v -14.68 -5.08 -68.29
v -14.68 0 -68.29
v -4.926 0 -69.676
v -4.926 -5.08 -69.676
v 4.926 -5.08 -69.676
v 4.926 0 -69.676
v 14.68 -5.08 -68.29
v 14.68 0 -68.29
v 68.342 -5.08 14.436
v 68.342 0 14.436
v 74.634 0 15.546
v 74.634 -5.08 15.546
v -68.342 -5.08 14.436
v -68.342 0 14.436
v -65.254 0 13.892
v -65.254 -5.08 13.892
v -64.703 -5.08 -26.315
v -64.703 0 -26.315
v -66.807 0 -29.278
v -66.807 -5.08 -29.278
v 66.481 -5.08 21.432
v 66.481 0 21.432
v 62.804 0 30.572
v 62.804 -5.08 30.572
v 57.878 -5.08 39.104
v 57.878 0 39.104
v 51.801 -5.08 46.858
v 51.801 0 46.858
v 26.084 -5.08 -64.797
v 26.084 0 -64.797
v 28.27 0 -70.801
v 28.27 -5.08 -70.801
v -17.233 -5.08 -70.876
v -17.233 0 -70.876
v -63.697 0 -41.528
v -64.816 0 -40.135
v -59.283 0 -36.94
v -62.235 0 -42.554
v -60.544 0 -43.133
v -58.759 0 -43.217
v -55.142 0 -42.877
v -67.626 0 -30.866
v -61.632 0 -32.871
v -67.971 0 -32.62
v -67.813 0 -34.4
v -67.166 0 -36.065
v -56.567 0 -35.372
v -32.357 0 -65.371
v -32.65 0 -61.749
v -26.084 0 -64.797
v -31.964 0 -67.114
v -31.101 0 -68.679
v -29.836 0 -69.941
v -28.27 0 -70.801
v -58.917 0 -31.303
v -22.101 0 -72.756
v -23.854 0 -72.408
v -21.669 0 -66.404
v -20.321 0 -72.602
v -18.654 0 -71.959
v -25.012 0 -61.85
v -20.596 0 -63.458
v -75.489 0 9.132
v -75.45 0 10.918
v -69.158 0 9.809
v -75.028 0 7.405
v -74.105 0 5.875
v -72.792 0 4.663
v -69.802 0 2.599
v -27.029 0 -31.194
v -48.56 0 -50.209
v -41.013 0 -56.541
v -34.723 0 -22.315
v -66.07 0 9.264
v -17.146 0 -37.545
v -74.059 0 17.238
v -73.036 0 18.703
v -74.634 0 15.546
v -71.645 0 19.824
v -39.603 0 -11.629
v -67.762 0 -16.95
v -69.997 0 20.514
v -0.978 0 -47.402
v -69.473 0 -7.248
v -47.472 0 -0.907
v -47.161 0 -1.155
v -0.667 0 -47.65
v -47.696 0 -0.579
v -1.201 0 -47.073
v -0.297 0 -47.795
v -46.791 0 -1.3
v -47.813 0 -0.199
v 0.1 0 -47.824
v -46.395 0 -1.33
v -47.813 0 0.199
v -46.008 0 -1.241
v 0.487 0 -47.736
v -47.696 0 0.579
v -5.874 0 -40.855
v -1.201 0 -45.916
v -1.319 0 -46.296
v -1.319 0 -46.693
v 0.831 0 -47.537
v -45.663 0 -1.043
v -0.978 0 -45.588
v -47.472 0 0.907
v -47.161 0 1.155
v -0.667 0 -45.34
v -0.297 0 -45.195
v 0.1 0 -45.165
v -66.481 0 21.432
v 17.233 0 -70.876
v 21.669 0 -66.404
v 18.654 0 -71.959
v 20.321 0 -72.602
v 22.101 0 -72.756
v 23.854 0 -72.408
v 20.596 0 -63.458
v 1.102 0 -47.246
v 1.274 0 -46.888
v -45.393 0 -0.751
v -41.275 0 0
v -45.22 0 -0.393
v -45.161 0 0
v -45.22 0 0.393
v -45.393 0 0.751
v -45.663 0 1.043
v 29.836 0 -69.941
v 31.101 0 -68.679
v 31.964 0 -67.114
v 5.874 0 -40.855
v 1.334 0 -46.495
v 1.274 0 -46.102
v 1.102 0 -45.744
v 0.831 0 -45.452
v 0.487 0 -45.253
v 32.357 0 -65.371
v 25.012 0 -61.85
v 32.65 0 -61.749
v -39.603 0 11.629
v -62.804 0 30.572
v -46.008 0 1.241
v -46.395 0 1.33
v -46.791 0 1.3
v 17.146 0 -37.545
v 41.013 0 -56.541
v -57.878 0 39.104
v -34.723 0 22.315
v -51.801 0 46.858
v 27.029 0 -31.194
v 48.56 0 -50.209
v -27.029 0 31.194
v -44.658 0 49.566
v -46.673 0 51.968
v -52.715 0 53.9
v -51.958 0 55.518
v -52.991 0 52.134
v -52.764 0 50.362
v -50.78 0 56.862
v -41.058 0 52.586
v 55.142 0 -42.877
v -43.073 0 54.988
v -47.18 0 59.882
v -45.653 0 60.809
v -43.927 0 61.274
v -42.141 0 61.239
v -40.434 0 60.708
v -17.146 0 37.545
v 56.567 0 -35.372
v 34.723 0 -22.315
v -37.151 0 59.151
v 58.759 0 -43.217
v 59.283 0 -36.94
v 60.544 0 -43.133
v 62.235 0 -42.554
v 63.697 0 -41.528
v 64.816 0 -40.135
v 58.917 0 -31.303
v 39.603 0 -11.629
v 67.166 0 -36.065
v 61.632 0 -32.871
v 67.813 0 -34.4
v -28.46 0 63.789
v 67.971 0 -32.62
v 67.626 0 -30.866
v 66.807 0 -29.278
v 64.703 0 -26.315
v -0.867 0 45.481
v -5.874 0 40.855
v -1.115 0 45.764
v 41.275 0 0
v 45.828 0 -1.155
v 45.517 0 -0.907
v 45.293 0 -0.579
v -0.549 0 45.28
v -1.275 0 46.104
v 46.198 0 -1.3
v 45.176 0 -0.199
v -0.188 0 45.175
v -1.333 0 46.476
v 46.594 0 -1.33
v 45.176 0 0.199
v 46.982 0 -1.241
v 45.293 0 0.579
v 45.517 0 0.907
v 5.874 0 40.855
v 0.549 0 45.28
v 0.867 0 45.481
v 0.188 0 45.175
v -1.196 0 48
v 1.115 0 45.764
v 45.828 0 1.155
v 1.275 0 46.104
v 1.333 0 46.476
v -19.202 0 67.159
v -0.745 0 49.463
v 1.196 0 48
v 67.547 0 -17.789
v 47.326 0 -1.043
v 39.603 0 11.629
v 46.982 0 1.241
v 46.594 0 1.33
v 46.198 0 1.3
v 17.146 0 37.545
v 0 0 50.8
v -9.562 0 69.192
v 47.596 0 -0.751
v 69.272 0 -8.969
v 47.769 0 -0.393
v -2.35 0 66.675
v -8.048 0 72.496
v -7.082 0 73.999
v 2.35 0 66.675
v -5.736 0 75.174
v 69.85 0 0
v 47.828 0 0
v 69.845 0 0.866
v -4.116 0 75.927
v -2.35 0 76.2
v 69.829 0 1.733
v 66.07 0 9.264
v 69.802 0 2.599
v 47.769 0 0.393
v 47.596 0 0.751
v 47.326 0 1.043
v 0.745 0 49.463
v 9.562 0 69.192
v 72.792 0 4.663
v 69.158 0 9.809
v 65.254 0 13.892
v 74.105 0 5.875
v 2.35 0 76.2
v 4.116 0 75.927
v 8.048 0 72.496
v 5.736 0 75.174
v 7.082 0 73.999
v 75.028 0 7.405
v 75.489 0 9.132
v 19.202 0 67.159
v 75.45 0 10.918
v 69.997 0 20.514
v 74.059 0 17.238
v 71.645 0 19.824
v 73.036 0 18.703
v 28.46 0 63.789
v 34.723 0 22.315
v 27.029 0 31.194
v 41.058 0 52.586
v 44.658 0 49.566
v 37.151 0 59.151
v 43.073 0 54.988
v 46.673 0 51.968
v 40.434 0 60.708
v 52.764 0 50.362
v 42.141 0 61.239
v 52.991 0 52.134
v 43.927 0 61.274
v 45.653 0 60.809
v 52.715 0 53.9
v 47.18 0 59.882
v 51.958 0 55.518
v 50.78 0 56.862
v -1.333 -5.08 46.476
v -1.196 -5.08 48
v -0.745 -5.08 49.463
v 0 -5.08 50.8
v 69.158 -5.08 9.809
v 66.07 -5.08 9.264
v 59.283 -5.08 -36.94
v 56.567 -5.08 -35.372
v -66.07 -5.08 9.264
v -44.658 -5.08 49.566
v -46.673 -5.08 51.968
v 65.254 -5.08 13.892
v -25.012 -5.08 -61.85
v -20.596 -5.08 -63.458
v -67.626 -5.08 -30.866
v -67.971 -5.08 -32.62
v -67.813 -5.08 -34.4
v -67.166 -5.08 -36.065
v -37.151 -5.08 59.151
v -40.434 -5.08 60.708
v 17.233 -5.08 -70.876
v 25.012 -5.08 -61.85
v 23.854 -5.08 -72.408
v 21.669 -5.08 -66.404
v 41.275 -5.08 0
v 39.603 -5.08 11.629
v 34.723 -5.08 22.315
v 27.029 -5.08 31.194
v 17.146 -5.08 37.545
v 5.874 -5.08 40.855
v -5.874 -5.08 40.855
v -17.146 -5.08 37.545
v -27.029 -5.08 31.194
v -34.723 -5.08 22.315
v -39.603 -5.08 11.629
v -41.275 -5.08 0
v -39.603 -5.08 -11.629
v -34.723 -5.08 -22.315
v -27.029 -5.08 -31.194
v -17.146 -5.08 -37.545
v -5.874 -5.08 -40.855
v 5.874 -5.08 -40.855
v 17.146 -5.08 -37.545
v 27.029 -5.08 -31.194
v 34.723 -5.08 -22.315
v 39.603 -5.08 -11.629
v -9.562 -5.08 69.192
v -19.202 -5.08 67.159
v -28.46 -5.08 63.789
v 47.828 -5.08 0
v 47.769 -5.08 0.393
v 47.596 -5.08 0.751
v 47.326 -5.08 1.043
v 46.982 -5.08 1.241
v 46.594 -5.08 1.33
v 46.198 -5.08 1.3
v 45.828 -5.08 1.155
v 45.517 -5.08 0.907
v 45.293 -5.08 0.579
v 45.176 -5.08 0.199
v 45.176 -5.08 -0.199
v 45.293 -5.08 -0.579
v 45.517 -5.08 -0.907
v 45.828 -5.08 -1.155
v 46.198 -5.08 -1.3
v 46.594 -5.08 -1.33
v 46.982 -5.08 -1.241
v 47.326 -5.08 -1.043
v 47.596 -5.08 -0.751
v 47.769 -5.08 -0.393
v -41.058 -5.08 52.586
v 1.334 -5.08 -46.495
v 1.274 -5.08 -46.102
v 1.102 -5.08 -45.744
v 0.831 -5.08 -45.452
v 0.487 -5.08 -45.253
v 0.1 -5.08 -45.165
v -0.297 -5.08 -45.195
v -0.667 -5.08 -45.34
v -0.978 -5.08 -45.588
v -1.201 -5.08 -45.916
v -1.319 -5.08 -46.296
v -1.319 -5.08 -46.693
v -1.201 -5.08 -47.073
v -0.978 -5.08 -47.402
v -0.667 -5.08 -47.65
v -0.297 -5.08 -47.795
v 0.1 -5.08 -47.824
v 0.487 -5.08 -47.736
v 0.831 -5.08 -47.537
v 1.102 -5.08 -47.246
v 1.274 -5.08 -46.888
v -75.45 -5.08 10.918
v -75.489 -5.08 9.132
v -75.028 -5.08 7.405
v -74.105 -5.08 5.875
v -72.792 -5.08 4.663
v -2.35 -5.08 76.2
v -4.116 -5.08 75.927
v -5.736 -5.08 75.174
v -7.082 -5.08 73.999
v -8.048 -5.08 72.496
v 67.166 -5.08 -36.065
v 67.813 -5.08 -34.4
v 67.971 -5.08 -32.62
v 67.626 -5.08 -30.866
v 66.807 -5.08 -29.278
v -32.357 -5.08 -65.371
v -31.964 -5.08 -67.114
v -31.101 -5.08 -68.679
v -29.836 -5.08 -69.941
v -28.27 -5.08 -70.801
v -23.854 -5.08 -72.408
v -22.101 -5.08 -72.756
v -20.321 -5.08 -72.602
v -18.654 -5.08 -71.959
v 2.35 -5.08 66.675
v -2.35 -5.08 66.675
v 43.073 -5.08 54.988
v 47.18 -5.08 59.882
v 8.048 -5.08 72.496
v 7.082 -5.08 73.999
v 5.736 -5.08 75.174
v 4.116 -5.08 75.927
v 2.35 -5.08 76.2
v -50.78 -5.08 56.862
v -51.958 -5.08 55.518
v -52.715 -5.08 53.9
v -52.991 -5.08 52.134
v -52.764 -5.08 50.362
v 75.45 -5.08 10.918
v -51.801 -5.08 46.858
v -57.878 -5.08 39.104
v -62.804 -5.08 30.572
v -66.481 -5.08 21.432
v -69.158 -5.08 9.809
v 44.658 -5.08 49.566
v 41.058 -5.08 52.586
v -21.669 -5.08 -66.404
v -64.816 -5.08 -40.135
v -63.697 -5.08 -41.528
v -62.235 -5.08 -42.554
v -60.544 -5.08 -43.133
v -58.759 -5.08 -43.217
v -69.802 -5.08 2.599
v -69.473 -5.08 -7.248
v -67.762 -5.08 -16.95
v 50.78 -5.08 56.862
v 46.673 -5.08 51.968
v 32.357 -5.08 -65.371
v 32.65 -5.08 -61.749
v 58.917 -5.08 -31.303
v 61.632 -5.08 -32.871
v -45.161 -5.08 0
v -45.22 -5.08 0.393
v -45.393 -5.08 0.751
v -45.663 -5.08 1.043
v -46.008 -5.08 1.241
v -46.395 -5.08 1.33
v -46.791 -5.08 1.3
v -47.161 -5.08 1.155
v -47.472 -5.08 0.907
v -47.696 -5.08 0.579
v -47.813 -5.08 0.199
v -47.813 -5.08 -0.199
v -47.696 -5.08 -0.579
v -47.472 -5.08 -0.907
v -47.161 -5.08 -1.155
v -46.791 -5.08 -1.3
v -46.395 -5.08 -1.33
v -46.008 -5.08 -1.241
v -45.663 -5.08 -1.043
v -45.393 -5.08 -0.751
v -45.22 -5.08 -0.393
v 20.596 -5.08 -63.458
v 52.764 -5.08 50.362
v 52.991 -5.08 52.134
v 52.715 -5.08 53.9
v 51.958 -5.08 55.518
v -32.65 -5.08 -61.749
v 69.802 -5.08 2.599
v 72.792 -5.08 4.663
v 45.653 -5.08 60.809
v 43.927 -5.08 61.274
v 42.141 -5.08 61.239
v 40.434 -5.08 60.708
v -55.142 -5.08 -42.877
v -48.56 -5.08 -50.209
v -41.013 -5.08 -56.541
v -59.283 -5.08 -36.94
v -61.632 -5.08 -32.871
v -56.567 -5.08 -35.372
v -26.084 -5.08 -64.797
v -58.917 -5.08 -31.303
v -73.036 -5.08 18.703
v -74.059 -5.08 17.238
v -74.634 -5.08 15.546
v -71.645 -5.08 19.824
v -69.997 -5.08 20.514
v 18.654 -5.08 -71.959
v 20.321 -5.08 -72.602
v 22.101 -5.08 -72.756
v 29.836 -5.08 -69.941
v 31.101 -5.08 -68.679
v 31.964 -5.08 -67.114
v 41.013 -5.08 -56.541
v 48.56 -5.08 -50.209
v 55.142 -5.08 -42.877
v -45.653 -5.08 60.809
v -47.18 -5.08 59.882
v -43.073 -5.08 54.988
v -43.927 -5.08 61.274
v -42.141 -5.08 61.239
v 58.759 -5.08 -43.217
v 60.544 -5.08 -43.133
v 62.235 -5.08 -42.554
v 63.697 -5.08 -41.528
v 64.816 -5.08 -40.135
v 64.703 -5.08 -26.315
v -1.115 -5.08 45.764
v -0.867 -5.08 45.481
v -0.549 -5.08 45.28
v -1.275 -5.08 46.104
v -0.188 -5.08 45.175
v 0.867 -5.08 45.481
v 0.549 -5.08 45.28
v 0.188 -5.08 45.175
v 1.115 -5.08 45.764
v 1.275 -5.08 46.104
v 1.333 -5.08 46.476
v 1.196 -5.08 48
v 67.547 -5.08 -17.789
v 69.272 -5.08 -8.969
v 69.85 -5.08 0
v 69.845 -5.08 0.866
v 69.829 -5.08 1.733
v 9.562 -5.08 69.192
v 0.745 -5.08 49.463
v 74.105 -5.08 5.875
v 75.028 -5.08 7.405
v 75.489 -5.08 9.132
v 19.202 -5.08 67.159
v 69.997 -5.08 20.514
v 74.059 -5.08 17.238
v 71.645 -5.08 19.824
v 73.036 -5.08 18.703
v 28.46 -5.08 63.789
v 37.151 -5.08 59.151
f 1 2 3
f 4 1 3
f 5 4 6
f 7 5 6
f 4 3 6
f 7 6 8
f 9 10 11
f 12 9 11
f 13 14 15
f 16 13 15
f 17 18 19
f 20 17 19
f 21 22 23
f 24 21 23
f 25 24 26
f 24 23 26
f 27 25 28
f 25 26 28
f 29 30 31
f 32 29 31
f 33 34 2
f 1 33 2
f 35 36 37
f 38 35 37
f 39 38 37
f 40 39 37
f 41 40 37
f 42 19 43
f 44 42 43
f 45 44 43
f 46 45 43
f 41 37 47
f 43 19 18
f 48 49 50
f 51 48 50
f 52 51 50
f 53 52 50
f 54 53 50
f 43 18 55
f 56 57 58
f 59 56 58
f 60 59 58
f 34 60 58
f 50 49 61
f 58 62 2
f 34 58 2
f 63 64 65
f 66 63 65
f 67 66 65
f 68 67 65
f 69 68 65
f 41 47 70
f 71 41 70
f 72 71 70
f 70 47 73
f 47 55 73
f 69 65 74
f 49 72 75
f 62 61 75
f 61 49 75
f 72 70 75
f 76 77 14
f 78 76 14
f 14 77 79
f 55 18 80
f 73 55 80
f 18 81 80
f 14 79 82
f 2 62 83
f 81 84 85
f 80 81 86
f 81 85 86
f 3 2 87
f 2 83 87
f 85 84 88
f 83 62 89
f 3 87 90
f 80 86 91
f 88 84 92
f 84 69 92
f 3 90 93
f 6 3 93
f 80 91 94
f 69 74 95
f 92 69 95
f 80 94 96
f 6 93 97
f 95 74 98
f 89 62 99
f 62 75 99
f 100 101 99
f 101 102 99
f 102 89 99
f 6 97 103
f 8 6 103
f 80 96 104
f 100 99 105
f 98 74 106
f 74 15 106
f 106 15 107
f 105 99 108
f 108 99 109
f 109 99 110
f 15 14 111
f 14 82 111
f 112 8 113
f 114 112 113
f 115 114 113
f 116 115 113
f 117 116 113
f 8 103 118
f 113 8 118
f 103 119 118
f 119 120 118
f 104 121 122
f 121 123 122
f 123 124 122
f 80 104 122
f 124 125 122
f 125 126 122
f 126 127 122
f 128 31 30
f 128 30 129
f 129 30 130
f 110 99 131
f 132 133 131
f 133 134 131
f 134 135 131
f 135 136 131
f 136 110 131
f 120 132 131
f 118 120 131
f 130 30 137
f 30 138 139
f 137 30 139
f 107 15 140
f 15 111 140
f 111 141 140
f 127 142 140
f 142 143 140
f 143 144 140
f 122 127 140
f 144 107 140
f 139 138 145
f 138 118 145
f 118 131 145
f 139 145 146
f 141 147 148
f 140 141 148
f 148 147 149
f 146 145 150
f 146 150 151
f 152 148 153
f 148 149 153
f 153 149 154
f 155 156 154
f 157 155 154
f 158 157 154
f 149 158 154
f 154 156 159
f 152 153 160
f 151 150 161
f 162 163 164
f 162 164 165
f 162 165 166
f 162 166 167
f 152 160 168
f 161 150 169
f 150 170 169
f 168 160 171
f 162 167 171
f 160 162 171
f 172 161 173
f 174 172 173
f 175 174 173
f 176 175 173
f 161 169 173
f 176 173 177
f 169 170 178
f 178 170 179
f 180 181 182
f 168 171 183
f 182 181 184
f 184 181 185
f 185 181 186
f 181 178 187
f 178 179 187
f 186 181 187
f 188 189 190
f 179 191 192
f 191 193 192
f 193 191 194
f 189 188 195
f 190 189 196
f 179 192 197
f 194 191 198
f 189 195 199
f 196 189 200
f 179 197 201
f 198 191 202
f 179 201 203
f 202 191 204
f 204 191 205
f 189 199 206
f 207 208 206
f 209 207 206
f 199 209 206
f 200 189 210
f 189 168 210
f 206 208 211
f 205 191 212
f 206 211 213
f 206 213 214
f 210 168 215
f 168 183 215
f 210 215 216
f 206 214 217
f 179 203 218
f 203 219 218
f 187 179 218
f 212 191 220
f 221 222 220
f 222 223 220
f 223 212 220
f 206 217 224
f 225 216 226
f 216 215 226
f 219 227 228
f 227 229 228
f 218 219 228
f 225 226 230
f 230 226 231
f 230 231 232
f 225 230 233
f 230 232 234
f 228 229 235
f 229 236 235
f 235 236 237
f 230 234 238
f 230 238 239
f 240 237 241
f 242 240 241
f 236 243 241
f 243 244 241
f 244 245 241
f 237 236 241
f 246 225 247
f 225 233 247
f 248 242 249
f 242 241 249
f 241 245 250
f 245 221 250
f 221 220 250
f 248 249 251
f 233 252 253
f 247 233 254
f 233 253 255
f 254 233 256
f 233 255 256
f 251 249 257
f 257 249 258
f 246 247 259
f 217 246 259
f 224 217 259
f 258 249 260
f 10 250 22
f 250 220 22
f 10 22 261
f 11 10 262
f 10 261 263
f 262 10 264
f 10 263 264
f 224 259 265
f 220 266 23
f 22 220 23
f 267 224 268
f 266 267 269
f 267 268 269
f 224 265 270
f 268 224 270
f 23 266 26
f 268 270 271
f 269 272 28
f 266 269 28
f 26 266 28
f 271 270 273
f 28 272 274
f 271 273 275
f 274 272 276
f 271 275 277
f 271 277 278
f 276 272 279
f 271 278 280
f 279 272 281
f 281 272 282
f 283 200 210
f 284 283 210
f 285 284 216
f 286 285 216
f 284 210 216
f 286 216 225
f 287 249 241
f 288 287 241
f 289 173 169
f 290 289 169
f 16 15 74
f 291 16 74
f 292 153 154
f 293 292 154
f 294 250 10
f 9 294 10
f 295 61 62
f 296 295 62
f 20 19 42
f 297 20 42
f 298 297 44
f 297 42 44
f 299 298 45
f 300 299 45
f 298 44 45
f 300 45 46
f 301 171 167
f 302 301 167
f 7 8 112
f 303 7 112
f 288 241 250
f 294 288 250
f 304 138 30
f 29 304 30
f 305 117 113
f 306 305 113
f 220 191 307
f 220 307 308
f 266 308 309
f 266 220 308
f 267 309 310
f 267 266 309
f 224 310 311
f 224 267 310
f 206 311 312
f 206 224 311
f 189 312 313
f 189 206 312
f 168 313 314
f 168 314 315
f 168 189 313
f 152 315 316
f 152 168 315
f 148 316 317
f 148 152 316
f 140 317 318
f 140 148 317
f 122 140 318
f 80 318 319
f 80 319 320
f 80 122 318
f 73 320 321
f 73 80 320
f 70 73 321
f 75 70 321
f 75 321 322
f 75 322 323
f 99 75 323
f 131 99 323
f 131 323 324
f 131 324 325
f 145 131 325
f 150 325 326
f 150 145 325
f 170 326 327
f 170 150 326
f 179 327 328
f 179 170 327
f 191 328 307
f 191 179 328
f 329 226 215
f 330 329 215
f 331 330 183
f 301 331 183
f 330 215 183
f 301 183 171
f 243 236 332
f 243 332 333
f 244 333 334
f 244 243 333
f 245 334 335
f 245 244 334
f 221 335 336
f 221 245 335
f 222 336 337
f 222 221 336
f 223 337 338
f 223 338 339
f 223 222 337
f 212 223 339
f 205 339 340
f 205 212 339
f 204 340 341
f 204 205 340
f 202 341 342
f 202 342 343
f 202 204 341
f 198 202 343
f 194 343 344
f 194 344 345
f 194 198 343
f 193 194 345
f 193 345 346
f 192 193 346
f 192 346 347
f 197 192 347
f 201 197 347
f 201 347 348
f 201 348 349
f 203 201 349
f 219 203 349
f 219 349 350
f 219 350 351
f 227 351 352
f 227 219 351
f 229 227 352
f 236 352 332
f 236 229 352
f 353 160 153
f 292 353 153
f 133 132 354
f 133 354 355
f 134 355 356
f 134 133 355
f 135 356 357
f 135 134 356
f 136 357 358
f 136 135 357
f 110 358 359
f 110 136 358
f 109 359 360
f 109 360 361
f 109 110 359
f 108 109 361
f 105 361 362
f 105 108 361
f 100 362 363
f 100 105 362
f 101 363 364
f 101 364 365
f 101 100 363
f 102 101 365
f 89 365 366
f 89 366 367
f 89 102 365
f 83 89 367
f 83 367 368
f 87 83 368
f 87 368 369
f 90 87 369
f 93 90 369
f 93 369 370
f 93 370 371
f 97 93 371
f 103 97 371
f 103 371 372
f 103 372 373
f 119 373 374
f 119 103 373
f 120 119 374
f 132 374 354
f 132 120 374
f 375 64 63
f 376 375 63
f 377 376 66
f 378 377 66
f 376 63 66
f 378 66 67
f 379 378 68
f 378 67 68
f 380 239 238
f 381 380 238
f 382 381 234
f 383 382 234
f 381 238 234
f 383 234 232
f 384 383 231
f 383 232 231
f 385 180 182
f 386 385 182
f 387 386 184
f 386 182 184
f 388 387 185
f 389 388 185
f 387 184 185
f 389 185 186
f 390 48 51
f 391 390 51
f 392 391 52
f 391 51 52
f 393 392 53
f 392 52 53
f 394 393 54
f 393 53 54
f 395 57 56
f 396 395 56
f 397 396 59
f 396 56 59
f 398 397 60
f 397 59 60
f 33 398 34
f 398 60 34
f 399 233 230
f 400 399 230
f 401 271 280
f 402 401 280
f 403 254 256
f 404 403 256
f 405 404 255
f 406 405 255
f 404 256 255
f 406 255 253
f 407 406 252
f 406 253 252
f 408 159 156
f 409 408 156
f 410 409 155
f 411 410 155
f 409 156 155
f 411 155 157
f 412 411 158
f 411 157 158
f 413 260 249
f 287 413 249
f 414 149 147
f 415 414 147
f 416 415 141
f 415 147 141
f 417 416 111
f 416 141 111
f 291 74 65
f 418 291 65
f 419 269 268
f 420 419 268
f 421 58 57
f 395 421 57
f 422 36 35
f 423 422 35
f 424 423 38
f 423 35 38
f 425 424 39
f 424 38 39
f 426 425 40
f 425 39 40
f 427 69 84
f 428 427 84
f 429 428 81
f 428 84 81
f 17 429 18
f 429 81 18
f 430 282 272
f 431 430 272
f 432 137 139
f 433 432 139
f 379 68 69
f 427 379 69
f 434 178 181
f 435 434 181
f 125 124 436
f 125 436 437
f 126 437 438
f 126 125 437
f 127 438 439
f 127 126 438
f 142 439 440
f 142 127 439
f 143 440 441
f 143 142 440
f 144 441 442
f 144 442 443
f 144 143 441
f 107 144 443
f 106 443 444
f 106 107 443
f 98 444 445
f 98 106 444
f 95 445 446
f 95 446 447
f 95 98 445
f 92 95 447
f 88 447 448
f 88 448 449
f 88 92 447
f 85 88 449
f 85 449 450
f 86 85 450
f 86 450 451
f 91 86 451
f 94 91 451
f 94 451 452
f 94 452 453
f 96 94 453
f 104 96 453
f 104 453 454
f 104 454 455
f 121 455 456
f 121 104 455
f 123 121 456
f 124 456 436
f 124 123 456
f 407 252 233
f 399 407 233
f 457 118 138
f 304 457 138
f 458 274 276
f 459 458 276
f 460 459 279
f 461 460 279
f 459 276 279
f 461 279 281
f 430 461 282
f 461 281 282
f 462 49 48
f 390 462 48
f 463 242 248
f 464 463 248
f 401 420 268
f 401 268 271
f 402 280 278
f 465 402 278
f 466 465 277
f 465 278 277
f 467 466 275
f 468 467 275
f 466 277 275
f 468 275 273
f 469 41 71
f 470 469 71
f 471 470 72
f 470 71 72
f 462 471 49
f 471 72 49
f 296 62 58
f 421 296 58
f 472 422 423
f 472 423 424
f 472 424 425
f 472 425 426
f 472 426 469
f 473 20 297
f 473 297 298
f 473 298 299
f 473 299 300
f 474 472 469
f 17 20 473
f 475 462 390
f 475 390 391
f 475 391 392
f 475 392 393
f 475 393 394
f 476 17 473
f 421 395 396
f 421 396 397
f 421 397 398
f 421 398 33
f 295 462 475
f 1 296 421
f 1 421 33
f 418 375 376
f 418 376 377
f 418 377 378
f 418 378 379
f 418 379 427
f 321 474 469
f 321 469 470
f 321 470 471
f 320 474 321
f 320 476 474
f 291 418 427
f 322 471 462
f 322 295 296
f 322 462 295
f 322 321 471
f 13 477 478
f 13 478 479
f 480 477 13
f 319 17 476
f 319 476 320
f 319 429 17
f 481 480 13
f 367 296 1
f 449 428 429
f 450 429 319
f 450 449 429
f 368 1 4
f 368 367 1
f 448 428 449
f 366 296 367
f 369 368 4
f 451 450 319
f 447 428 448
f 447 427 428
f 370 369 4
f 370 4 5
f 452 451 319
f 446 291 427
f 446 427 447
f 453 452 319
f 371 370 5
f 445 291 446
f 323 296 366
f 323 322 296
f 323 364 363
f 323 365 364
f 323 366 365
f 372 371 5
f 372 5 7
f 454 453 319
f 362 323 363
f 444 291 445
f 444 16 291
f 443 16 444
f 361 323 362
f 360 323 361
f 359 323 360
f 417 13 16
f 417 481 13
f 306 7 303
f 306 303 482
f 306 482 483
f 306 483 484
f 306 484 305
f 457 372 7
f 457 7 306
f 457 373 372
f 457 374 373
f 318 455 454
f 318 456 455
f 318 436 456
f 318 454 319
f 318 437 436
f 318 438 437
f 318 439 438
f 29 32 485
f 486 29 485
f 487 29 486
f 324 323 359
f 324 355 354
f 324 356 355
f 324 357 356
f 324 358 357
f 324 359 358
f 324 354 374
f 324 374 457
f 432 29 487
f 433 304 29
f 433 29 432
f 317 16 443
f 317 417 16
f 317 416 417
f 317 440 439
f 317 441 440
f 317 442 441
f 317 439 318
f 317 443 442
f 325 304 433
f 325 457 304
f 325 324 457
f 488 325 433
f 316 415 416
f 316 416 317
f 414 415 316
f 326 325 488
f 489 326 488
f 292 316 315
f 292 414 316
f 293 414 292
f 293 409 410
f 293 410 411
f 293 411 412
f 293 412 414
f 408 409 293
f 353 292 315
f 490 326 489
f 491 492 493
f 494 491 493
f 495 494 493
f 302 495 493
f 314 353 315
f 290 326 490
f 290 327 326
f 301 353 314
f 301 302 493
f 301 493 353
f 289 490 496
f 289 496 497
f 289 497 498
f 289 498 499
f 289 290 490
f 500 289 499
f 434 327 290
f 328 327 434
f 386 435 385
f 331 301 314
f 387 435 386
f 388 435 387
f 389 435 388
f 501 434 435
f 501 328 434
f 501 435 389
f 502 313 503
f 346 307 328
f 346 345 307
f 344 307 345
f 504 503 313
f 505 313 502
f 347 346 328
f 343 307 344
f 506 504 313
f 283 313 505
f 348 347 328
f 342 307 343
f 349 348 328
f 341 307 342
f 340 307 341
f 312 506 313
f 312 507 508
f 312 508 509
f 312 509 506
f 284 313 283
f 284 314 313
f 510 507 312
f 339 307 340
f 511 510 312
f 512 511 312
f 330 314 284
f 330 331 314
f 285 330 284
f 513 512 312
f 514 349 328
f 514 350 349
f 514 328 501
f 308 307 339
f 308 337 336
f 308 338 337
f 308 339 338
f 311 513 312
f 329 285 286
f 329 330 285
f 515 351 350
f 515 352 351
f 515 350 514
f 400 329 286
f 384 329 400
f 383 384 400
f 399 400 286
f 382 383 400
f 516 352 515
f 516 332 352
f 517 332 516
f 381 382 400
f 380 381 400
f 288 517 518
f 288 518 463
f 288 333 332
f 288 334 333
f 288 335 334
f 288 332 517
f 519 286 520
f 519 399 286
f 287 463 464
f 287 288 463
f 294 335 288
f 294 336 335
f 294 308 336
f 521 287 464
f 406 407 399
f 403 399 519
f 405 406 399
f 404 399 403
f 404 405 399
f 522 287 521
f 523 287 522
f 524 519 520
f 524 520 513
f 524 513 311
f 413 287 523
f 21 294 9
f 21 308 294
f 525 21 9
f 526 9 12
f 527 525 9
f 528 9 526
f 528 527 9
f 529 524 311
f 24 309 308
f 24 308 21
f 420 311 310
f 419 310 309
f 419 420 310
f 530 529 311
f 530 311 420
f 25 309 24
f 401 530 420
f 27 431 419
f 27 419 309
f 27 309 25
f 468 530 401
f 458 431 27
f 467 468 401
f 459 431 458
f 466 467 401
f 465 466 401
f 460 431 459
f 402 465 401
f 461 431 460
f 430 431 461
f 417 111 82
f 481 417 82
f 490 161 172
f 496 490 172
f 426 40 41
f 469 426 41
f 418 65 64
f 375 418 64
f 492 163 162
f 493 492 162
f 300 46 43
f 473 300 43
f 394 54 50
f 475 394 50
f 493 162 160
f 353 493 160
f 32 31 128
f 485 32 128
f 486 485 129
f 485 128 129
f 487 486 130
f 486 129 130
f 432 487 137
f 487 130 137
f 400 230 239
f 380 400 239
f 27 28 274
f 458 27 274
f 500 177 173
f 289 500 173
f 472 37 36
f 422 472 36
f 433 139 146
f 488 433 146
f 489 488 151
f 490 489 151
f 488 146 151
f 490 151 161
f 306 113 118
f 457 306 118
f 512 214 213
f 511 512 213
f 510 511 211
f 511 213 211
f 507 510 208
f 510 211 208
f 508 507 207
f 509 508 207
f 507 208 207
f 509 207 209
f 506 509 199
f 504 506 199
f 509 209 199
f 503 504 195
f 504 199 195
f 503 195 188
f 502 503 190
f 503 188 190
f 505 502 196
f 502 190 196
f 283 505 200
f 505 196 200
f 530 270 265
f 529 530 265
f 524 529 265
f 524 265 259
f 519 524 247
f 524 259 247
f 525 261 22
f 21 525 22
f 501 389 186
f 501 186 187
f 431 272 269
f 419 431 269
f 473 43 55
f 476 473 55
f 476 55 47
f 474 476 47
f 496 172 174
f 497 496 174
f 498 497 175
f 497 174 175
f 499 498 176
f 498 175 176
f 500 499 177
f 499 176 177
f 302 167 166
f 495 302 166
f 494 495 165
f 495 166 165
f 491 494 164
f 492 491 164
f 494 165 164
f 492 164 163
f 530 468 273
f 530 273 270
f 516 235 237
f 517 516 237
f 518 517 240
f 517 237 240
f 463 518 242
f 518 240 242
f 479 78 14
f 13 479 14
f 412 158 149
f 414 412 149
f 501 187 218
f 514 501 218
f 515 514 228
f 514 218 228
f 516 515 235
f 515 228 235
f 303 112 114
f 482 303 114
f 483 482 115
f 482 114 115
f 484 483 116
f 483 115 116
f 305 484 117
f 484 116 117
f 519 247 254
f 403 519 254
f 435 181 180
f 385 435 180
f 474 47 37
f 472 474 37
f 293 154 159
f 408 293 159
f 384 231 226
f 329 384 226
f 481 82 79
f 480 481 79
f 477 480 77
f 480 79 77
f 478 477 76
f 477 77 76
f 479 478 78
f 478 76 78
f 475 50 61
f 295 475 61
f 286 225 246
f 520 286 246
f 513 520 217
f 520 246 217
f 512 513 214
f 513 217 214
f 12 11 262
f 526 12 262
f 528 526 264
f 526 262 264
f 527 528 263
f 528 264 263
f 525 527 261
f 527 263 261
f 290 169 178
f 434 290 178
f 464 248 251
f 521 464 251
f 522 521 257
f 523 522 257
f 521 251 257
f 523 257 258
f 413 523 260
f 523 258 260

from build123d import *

# Parameters (mm, degrees)
F0_R     = 1.3335
F0_R_2   = 41.275
F1_DEPTH = 5.08


with BuildPart() as f1:
    # F0 (on Front) → F1 (new body)
    with BuildSketch(Plane.XZ):
        with BuildLine():
            ThreePointArc((64.703313688, -26.3154649928), (68.5512544054, -13.4070138154), (69.85, 0))
            ThreePointArc((69.85, 0), (69.8379103341, 1.2995307458), (69.8016455216, 2.5986116451))
            ThreePointArc((69.8016455216, 2.5986116451), (69.5732263207, 6.2119786965), (69.1578829213, 9.8086558631))
            Line((69.1578829213, 9.8086558631), (66.0700433255, 9.2641864302))
            Line((66.0700433255, 9.2641864302), (65.2540705387, 13.8917980616))
            Line((65.2540705387, 13.8917980616), (68.3419101345, 14.4362674945))
            ThreePointArc((68.3419101345, 14.4362674945), (67.502069222, 17.9580942962), (66.4808687426, 21.4316726185))
            ThreePointArc((66.4808687426, 21.4316726185), (60.4918744543, 34.925), (51.8008073045, 46.8582848875))
            ThreePointArc((51.8008073045, 46.8582848875), (49.3032004751, 49.4794596061), (46.6731294533, 51.9676965724))
            Line((46.6731294533, 51.9676965724), (44.657685295, 49.565783756))
            Line((44.657685295, 49.565783756), (41.0580424567, 52.5862427339))
            Line((41.0580424567, 52.5862427339), (43.0734866151, 54.9881555503))
            ThreePointArc((43.0734866151, 54.9881555503), (40.1663445193, 57.1461920687), (37.15128646, 59.1506924251))
            ThreePointArc((37.15128646, 59.1506924251), (23.8901070113, 65.6375295619), (9.5617956478, 69.1924458593))
            ThreePointArc((9.5617956478, 69.1924458593), (5.9636591831, 69.5949514631), (2.3495, 69.8104744988))
            Line((2.3495, 69.8104744988), (2.3495, 66.675))
            Line((2.3495, 66.675), (-2.3495, 66.675))
            Line((-2.3495, 66.675), (-2.3495, 69.8104744988))
            ThreePointArc((-2.3495, 69.8104744988), (-5.9636591831, 69.5949514631), (-9.5617956478, 69.1924458593))
            ThreePointArc((-9.5617956478, 69.1924458593), (-23.8901070113, 65.6375295619), (-37.15128646, 59.1506924251))
            ThreePointArc((-37.15128646, 59.1506924251), (-40.1663445193, 57.1461920687), (-43.0734866151, 54.9881555503))
            Line((-43.0734866151, 54.9881555503), (-41.0580424567, 52.5862427339))
            Line((-41.0580424567, 52.5862427339), (-44.657685295, 49.565783756))
            Line((-44.657685295, 49.565783756), (-46.6731294533, 51.9676965724))
            ThreePointArc((-46.6731294533, 51.9676965724), (-49.3032004751, 49.4794596061), (-51.8008073045, 46.8582848875))
            ThreePointArc((-51.8008073045, 46.8582848875), (-60.4918744543, 34.925), (-66.4808687426, 21.4316726185))
            ThreePointArc((-66.4808687426, 21.4316726185), (-67.502069222, 17.9580942962), (-68.3419101345, 14.4362674945))
            Line((-68.3419101345, 14.4362674945), (-65.2540705387, 13.8917980616))
            Line((-65.2540705387, 13.8917980616), (-66.0700433255, 9.2641864302))
            Line((-66.0700433255, 9.2641864302), (-69.1578829213, 9.8086558631))
            ThreePointArc((-69.1578829213, 9.8086558631), (-69.5732263207, 6.2119786965), (-69.8016455216, 2.5986116451))
            ThreePointArc((-69.8016455216, 2.5986116451), (-68.7888215479, -12.12932521), (-64.703313688, -26.3154649928))
            ThreePointArc((-64.703313688, -26.3154649928), (-63.2528255337, -29.6327953794), (-61.6323943662, -32.8705105632))
            Line((-61.6323943662, -32.8705105632), (-58.9169937973, -31.3027733138))
            Line((-58.9169937973, -31.3027733138), (-56.5674937973, -35.3722266862))
            Line((-56.5674937973, -35.3722266862), (-59.2828943662, -36.9399639356))
            ThreePointArc((-59.2828943662, -36.9399639356), (-57.2891663506, -39.9621560836), (-55.1415180402, -42.8769808665))
            ThreePointArc((-55.1415180402, -42.8769808665), (-44.8987145366, -53.5082043519), (-32.6503590616, -61.7493040702))
            ThreePointArc((-32.6503590616, -61.7493040702), (-29.4068818014, -63.3581707653), (-26.0843963063, -64.7968114134))
            Line((-26.0843963063, -64.7968114134), (-25.0120008688, -61.8504291642))
            Line((-25.0120008688, -61.8504291642), (-20.5963852437, -63.4575818176))
            Line((-20.5963852437, -63.4575818176), (-21.6687806812, -66.4039640668))
            ThreePointArc((-21.6687806812, -66.4039640668), (-18.1988687469, -67.4375539024), (-14.6800614381, -68.289957506))
            ThreePointArc((-14.6800614381, -68.289957506), (0, -69.85), (14.6800614381, -68.289957506))
            ThreePointArc((14.6800614381, -68.289957506), (18.1988687469, -67.4375539024), (21.6687806812, -66.4039640668))
            Line((21.6687806812, -66.4039640668), (20.5963852437, -63.4575818176))
            Line((20.5963852437, -63.4575818176), (25.0120008688, -61.8504291642))
            Line((25.0120008688, -61.8504291642), (26.0843963063, -64.7968114134))
            ThreePointArc((26.0843963063, -64.7968114134), (29.4068818014, -63.3581707653), (32.6503590616, -61.7493040702))
            ThreePointArc((32.6503590616, -61.7493040702), (44.8987145366, -53.5082043519), (55.1415180402, -42.8769808665))
            ThreePointArc((55.1415180402, -42.8769808665), (57.2891663506, -39.9621560836), (59.2828943662, -36.9399639356))
            Line((59.2828943662, -36.9399639356), (56.5674937973, -35.3722266862))
            Line((56.5674937973, -35.3722266862), (58.9169937973, -31.3027733138))
            Line((58.9169937973, -31.3027733138), (61.6323943662, -32.8705105632))
            ThreePointArc((61.6323943662, -32.8705105632), (63.2528255337, -29.6327953794), (64.703313688, -26.3154649928))
        make_face()
        with Locations((0, -46.4947)):
            Circle(F0_R, mode=Mode.SUBTRACT)
        with Locations((-46.4947, 0)):
            Circle(F0_R, mode=Mode.SUBTRACT)
        Circle(F0_R_2, mode=Mode.SUBTRACT)
        with Locations((46.4947, 0)):
            Circle(F0_R, mode=Mode.SUBTRACT)
        with BuildLine():
            ThreePointArc((1.3333628788, 46.4755771511), (0, 45.1612), (-1.3333628788, 46.4755771511))
            ThreePointArc((-1.3333628788, 46.4755771511), (-1.0083284803, 48.7431296807), (0, 50.8))
            ThreePointArc((0, 50.8), (1.0083284803, 48.7431296807), (1.3333628788, 46.4755771511))
        make_face(mode=Mode.SUBTRACT)
        with BuildLine():
            ThreePointArc((-43.0734866151, 54.9881555503), (-40.1663445193, 57.1461920687), (-37.15128646, 59.1506924251))
            Line((-37.15128646, 59.1506924251), (-40.4344191153, 60.7079840043))
            ThreePointArc((-40.4344191153, 60.7079840043), (-43.9270989611, 61.2736681367), (-47.1803151418, 59.8824832012))
            Line((-47.1803151418, 59.8824832012), (-43.0734866151, 54.9881555503))
        make_face()
        with BuildLine():
            ThreePointArc((-51.8008073045, 46.8582848875), (-49.3032004751, 49.4794596061), (-46.6731294533, 51.9676965724))
            Line((-46.6731294533, 51.9676965724), (-50.7799579801, 56.8620242233))
            ThreePointArc((-50.7799579801, 56.8620242233), (-52.7149227517, 53.8998084352), (-52.7643301228, 50.3619602255))
            Line((-52.7643301228, 50.3619602255), (-51.8008073045, 46.8582848875))
        make_face()
        with BuildLine():
            ThreePointArc((-9.5617956478, 69.1924458593), (-5.9636591831, 69.5949514631), (-2.3495, 69.8104744988))
            Line((-2.3495, 69.8104744988), (-2.3495, 76.1995654907))
            ThreePointArc((-2.3495, 76.1995654907), (-5.7358446168, 75.1741479273), (-8.047777853, 72.4957574116))
            Line((-8.047777853, 72.4957574116), (-9.5617956478, 69.1924458593))
        make_face()
        with BuildLine():
            ThreePointArc((2.3495, 69.8104744988), (5.9636591831, 69.5949514631), (9.5617956478, 69.1924458593))
            Line((9.5617956478, 69.1924458593), (8.047777853, 72.4957574116))
            ThreePointArc((8.047777853, 72.4957574116), (5.7358446168, 75.1741479273), (2.3495, 76.1995654907))
            Line((2.3495, 76.1995654907), (2.3495, 69.8104744988))
        make_face()
        with BuildLine():
            ThreePointArc((37.15128646, 59.1506924251), (40.1663445193, 57.1461920687), (43.0734866151, 54.9881555503))
            Line((43.0734866151, 54.9881555503), (47.1803151418, 59.8824832012))
            ThreePointArc((47.1803151418, 59.8824832012), (43.9270989611, 61.2736681367), (40.4344191153, 60.7079840043))
            Line((40.4344191153, 60.7079840043), (37.15128646, 59.1506924251))
        make_face()
        with BuildLine():
            ThreePointArc((46.6731294533, 51.9676965724), (49.3032004751, 49.4794596061), (51.8008073045, 46.8582848875))
            Line((51.8008073045, 46.8582848875), (52.7643301228, 50.3619602255))
            ThreePointArc((52.7643301228, 50.3619602255), (52.7149227517, 53.8998084352), (50.7799579801, 56.8620242233))
            Line((50.7799579801, 56.8620242233), (46.6731294533, 51.9676965724))
        make_face()
        with BuildLine():
            ThreePointArc((66.4808687426, 21.4316726185), (67.502069222, 17.9580942962), (68.3419101345, 14.4362674945))
            Line((68.3419101345, 14.4362674945), (74.633936478, 15.5457215022))
            ThreePointArc((74.633936478, 15.5457215022), (73.0360647398, 18.7025580439), (69.996902001, 20.5142701873))
            Line((69.996902001, 20.5142701873), (66.4808687426, 21.4316726185))
        make_face()
        with BuildLine():
            ThreePointArc((69.1578829213, 9.8086558631), (69.5732263207, 6.2119786965), (69.8016455216, 2.5986116451))
            Line((69.8016455216, 2.5986116451), (72.7918659179, 4.663242139))
            ThreePointArc((72.7918659179, 4.663242139), (75.02810267, 7.4051495465), (75.4499092649, 10.9181098708))
            Line((75.4499092649, 10.9181098708), (69.1578829213, 9.8086558631))
        make_face()
        with BuildLine():
            Line((66.8070565116, -29.2782986411), (64.703313688, -26.3154649928))
            ThreePointArc((64.703313688, -26.3154649928), (63.2528255337, -29.6327953794), (61.6323943662, -32.8705105632))
            Line((61.6323943662, -32.8705105632), (67.1655094723, -36.0650560592))
            ThreePointArc((67.1655094723, -36.0650560592), (67.9706441213, -32.6196868133), (66.8070565116, -29.2782986411))
        make_face()
        with BuildLine():
            Line((64.8160094723, -40.1345094316), (59.2828943662, -36.9399639356))
            ThreePointArc((59.2828943662, -36.9399639356), (57.2891663506, -39.9621560836), (55.1415180402, -42.8769808665))
            Line((55.1415180402, -42.8769808665), (58.7592786586, -43.2174587705))
            ThreePointArc((58.7592786586, -43.2174587705), (62.2347995045, -42.554461114), (64.8160094723, -40.1345094316))
        make_face()
        with BuildLine():
            Line((23.853978498, -72.4077457255), (21.6687806812, -66.4039640668))
            ThreePointArc((21.6687806812, -66.4039640668), (18.1988687469, -67.4375539024), (14.6800614381, -68.289957506))
            Line((14.6800614381, -68.289957506), (17.2325718782, -70.8762304127))
            ThreePointArc((17.2325718782, -70.8762304127), (20.3211419881, -72.6023664791), (23.853978498, -72.4077457255))
        make_face()
        with BuildLine():
            Line((32.3574468026, -65.3712261433), (32.6503590616, -61.7493040702))
            ThreePointArc((32.6503590616, -61.7493040702), (29.4068818014, -63.3581707653), (26.0843963063, -64.7968114134))
            Line((26.0843963063, -64.7968114134), (28.269594123, -70.800593072))
            ThreePointArc((28.269594123, -70.800593072), (31.1010037089, -68.6788176832), (32.3574468026, -65.3712261433))
        make_face()
        with BuildLine():
            Line((-28.269594123, -70.800593072), (-26.0843963063, -64.7968114134))
            ThreePointArc((-26.0843963063, -64.7968114134), (-29.4068818014, -63.3581707653), (-32.6503590616, -61.7493040702))
            Line((-32.6503590616, -61.7493040702), (-32.3574468026, -65.3712261433))
            ThreePointArc((-32.3574468026, -65.3712261433), (-31.1010037089, -68.6788176832), (-28.269594123, -70.800593072))
        make_face()
        with BuildLine():
            Line((-17.2325718782, -70.8762304127), (-14.6800614381, -68.289957506))
            ThreePointArc((-14.6800614381, -68.289957506), (-18.1988687469, -67.4375539024), (-21.6687806812, -66.4039640668))
            Line((-21.6687806812, -66.4039640668), (-23.853978498, -72.4077457255))
            ThreePointArc((-23.853978498, -72.4077457255), (-20.3211419881, -72.6023664791), (-17.2325718782, -70.8762304127))
        make_face()
        with BuildLine():
            Line((-58.7592786586, -43.2174587705), (-55.1415180402, -42.8769808665))
            ThreePointArc((-55.1415180402, -42.8769808665), (-57.2891663506, -39.9621560836), (-59.2828943662, -36.9399639356))
            Line((-59.2828943662, -36.9399639356), (-64.8160094723, -40.1345094316))
            ThreePointArc((-64.8160094723, -40.1345094316), (-62.2347995045, -42.554461114), (-58.7592786586, -43.2174587705))
        make_face()
        with BuildLine():
            Line((-67.1655094723, -36.0650560592), (-61.6323943662, -32.8705105632))
            ThreePointArc((-61.6323943662, -32.8705105632), (-63.2528255337, -29.6327953794), (-64.703313688, -26.3154649928))
            Line((-64.703313688, -26.3154649928), (-66.8070565116, -29.2782986411))
            ThreePointArc((-66.8070565116, -29.2782986411), (-67.9706441213, -32.6196868133), (-67.1655094723, -36.0650560592))
        make_face()
        with BuildLine():
            Line((-72.7918659179, 4.663242139), (-69.8016455216, 2.5986116451))
            ThreePointArc((-69.8016455216, 2.5986116451), (-69.5732263207, 6.2119786965), (-69.1578829213, 9.8086558631))
            Line((-69.1578829213, 9.8086558631), (-75.4499092649, 10.9181098708))
            ThreePointArc((-75.4499092649, 10.9181098708), (-75.02810267, 7.4051495465), (-72.7918659179, 4.663242139))
        make_face()
        with BuildLine():
            ThreePointArc((-68.3419101345, 14.4362674945), (-67.502069222, 17.9580942962), (-66.4808687426, 21.4316726185))
            Line((-66.4808687426, 21.4316726185), (-69.996902001, 20.5142701873))
            ThreePointArc((-69.996902001, 20.5142701873), (-73.0360647398, 18.7025580439), (-74.633936478, 15.5457215022))
            Line((-74.633936478, 15.5457215022), (-68.3419101345, 14.4362674945))
        make_face()
    extrude(amount=F1_DEPTH)


solid = f1.part
